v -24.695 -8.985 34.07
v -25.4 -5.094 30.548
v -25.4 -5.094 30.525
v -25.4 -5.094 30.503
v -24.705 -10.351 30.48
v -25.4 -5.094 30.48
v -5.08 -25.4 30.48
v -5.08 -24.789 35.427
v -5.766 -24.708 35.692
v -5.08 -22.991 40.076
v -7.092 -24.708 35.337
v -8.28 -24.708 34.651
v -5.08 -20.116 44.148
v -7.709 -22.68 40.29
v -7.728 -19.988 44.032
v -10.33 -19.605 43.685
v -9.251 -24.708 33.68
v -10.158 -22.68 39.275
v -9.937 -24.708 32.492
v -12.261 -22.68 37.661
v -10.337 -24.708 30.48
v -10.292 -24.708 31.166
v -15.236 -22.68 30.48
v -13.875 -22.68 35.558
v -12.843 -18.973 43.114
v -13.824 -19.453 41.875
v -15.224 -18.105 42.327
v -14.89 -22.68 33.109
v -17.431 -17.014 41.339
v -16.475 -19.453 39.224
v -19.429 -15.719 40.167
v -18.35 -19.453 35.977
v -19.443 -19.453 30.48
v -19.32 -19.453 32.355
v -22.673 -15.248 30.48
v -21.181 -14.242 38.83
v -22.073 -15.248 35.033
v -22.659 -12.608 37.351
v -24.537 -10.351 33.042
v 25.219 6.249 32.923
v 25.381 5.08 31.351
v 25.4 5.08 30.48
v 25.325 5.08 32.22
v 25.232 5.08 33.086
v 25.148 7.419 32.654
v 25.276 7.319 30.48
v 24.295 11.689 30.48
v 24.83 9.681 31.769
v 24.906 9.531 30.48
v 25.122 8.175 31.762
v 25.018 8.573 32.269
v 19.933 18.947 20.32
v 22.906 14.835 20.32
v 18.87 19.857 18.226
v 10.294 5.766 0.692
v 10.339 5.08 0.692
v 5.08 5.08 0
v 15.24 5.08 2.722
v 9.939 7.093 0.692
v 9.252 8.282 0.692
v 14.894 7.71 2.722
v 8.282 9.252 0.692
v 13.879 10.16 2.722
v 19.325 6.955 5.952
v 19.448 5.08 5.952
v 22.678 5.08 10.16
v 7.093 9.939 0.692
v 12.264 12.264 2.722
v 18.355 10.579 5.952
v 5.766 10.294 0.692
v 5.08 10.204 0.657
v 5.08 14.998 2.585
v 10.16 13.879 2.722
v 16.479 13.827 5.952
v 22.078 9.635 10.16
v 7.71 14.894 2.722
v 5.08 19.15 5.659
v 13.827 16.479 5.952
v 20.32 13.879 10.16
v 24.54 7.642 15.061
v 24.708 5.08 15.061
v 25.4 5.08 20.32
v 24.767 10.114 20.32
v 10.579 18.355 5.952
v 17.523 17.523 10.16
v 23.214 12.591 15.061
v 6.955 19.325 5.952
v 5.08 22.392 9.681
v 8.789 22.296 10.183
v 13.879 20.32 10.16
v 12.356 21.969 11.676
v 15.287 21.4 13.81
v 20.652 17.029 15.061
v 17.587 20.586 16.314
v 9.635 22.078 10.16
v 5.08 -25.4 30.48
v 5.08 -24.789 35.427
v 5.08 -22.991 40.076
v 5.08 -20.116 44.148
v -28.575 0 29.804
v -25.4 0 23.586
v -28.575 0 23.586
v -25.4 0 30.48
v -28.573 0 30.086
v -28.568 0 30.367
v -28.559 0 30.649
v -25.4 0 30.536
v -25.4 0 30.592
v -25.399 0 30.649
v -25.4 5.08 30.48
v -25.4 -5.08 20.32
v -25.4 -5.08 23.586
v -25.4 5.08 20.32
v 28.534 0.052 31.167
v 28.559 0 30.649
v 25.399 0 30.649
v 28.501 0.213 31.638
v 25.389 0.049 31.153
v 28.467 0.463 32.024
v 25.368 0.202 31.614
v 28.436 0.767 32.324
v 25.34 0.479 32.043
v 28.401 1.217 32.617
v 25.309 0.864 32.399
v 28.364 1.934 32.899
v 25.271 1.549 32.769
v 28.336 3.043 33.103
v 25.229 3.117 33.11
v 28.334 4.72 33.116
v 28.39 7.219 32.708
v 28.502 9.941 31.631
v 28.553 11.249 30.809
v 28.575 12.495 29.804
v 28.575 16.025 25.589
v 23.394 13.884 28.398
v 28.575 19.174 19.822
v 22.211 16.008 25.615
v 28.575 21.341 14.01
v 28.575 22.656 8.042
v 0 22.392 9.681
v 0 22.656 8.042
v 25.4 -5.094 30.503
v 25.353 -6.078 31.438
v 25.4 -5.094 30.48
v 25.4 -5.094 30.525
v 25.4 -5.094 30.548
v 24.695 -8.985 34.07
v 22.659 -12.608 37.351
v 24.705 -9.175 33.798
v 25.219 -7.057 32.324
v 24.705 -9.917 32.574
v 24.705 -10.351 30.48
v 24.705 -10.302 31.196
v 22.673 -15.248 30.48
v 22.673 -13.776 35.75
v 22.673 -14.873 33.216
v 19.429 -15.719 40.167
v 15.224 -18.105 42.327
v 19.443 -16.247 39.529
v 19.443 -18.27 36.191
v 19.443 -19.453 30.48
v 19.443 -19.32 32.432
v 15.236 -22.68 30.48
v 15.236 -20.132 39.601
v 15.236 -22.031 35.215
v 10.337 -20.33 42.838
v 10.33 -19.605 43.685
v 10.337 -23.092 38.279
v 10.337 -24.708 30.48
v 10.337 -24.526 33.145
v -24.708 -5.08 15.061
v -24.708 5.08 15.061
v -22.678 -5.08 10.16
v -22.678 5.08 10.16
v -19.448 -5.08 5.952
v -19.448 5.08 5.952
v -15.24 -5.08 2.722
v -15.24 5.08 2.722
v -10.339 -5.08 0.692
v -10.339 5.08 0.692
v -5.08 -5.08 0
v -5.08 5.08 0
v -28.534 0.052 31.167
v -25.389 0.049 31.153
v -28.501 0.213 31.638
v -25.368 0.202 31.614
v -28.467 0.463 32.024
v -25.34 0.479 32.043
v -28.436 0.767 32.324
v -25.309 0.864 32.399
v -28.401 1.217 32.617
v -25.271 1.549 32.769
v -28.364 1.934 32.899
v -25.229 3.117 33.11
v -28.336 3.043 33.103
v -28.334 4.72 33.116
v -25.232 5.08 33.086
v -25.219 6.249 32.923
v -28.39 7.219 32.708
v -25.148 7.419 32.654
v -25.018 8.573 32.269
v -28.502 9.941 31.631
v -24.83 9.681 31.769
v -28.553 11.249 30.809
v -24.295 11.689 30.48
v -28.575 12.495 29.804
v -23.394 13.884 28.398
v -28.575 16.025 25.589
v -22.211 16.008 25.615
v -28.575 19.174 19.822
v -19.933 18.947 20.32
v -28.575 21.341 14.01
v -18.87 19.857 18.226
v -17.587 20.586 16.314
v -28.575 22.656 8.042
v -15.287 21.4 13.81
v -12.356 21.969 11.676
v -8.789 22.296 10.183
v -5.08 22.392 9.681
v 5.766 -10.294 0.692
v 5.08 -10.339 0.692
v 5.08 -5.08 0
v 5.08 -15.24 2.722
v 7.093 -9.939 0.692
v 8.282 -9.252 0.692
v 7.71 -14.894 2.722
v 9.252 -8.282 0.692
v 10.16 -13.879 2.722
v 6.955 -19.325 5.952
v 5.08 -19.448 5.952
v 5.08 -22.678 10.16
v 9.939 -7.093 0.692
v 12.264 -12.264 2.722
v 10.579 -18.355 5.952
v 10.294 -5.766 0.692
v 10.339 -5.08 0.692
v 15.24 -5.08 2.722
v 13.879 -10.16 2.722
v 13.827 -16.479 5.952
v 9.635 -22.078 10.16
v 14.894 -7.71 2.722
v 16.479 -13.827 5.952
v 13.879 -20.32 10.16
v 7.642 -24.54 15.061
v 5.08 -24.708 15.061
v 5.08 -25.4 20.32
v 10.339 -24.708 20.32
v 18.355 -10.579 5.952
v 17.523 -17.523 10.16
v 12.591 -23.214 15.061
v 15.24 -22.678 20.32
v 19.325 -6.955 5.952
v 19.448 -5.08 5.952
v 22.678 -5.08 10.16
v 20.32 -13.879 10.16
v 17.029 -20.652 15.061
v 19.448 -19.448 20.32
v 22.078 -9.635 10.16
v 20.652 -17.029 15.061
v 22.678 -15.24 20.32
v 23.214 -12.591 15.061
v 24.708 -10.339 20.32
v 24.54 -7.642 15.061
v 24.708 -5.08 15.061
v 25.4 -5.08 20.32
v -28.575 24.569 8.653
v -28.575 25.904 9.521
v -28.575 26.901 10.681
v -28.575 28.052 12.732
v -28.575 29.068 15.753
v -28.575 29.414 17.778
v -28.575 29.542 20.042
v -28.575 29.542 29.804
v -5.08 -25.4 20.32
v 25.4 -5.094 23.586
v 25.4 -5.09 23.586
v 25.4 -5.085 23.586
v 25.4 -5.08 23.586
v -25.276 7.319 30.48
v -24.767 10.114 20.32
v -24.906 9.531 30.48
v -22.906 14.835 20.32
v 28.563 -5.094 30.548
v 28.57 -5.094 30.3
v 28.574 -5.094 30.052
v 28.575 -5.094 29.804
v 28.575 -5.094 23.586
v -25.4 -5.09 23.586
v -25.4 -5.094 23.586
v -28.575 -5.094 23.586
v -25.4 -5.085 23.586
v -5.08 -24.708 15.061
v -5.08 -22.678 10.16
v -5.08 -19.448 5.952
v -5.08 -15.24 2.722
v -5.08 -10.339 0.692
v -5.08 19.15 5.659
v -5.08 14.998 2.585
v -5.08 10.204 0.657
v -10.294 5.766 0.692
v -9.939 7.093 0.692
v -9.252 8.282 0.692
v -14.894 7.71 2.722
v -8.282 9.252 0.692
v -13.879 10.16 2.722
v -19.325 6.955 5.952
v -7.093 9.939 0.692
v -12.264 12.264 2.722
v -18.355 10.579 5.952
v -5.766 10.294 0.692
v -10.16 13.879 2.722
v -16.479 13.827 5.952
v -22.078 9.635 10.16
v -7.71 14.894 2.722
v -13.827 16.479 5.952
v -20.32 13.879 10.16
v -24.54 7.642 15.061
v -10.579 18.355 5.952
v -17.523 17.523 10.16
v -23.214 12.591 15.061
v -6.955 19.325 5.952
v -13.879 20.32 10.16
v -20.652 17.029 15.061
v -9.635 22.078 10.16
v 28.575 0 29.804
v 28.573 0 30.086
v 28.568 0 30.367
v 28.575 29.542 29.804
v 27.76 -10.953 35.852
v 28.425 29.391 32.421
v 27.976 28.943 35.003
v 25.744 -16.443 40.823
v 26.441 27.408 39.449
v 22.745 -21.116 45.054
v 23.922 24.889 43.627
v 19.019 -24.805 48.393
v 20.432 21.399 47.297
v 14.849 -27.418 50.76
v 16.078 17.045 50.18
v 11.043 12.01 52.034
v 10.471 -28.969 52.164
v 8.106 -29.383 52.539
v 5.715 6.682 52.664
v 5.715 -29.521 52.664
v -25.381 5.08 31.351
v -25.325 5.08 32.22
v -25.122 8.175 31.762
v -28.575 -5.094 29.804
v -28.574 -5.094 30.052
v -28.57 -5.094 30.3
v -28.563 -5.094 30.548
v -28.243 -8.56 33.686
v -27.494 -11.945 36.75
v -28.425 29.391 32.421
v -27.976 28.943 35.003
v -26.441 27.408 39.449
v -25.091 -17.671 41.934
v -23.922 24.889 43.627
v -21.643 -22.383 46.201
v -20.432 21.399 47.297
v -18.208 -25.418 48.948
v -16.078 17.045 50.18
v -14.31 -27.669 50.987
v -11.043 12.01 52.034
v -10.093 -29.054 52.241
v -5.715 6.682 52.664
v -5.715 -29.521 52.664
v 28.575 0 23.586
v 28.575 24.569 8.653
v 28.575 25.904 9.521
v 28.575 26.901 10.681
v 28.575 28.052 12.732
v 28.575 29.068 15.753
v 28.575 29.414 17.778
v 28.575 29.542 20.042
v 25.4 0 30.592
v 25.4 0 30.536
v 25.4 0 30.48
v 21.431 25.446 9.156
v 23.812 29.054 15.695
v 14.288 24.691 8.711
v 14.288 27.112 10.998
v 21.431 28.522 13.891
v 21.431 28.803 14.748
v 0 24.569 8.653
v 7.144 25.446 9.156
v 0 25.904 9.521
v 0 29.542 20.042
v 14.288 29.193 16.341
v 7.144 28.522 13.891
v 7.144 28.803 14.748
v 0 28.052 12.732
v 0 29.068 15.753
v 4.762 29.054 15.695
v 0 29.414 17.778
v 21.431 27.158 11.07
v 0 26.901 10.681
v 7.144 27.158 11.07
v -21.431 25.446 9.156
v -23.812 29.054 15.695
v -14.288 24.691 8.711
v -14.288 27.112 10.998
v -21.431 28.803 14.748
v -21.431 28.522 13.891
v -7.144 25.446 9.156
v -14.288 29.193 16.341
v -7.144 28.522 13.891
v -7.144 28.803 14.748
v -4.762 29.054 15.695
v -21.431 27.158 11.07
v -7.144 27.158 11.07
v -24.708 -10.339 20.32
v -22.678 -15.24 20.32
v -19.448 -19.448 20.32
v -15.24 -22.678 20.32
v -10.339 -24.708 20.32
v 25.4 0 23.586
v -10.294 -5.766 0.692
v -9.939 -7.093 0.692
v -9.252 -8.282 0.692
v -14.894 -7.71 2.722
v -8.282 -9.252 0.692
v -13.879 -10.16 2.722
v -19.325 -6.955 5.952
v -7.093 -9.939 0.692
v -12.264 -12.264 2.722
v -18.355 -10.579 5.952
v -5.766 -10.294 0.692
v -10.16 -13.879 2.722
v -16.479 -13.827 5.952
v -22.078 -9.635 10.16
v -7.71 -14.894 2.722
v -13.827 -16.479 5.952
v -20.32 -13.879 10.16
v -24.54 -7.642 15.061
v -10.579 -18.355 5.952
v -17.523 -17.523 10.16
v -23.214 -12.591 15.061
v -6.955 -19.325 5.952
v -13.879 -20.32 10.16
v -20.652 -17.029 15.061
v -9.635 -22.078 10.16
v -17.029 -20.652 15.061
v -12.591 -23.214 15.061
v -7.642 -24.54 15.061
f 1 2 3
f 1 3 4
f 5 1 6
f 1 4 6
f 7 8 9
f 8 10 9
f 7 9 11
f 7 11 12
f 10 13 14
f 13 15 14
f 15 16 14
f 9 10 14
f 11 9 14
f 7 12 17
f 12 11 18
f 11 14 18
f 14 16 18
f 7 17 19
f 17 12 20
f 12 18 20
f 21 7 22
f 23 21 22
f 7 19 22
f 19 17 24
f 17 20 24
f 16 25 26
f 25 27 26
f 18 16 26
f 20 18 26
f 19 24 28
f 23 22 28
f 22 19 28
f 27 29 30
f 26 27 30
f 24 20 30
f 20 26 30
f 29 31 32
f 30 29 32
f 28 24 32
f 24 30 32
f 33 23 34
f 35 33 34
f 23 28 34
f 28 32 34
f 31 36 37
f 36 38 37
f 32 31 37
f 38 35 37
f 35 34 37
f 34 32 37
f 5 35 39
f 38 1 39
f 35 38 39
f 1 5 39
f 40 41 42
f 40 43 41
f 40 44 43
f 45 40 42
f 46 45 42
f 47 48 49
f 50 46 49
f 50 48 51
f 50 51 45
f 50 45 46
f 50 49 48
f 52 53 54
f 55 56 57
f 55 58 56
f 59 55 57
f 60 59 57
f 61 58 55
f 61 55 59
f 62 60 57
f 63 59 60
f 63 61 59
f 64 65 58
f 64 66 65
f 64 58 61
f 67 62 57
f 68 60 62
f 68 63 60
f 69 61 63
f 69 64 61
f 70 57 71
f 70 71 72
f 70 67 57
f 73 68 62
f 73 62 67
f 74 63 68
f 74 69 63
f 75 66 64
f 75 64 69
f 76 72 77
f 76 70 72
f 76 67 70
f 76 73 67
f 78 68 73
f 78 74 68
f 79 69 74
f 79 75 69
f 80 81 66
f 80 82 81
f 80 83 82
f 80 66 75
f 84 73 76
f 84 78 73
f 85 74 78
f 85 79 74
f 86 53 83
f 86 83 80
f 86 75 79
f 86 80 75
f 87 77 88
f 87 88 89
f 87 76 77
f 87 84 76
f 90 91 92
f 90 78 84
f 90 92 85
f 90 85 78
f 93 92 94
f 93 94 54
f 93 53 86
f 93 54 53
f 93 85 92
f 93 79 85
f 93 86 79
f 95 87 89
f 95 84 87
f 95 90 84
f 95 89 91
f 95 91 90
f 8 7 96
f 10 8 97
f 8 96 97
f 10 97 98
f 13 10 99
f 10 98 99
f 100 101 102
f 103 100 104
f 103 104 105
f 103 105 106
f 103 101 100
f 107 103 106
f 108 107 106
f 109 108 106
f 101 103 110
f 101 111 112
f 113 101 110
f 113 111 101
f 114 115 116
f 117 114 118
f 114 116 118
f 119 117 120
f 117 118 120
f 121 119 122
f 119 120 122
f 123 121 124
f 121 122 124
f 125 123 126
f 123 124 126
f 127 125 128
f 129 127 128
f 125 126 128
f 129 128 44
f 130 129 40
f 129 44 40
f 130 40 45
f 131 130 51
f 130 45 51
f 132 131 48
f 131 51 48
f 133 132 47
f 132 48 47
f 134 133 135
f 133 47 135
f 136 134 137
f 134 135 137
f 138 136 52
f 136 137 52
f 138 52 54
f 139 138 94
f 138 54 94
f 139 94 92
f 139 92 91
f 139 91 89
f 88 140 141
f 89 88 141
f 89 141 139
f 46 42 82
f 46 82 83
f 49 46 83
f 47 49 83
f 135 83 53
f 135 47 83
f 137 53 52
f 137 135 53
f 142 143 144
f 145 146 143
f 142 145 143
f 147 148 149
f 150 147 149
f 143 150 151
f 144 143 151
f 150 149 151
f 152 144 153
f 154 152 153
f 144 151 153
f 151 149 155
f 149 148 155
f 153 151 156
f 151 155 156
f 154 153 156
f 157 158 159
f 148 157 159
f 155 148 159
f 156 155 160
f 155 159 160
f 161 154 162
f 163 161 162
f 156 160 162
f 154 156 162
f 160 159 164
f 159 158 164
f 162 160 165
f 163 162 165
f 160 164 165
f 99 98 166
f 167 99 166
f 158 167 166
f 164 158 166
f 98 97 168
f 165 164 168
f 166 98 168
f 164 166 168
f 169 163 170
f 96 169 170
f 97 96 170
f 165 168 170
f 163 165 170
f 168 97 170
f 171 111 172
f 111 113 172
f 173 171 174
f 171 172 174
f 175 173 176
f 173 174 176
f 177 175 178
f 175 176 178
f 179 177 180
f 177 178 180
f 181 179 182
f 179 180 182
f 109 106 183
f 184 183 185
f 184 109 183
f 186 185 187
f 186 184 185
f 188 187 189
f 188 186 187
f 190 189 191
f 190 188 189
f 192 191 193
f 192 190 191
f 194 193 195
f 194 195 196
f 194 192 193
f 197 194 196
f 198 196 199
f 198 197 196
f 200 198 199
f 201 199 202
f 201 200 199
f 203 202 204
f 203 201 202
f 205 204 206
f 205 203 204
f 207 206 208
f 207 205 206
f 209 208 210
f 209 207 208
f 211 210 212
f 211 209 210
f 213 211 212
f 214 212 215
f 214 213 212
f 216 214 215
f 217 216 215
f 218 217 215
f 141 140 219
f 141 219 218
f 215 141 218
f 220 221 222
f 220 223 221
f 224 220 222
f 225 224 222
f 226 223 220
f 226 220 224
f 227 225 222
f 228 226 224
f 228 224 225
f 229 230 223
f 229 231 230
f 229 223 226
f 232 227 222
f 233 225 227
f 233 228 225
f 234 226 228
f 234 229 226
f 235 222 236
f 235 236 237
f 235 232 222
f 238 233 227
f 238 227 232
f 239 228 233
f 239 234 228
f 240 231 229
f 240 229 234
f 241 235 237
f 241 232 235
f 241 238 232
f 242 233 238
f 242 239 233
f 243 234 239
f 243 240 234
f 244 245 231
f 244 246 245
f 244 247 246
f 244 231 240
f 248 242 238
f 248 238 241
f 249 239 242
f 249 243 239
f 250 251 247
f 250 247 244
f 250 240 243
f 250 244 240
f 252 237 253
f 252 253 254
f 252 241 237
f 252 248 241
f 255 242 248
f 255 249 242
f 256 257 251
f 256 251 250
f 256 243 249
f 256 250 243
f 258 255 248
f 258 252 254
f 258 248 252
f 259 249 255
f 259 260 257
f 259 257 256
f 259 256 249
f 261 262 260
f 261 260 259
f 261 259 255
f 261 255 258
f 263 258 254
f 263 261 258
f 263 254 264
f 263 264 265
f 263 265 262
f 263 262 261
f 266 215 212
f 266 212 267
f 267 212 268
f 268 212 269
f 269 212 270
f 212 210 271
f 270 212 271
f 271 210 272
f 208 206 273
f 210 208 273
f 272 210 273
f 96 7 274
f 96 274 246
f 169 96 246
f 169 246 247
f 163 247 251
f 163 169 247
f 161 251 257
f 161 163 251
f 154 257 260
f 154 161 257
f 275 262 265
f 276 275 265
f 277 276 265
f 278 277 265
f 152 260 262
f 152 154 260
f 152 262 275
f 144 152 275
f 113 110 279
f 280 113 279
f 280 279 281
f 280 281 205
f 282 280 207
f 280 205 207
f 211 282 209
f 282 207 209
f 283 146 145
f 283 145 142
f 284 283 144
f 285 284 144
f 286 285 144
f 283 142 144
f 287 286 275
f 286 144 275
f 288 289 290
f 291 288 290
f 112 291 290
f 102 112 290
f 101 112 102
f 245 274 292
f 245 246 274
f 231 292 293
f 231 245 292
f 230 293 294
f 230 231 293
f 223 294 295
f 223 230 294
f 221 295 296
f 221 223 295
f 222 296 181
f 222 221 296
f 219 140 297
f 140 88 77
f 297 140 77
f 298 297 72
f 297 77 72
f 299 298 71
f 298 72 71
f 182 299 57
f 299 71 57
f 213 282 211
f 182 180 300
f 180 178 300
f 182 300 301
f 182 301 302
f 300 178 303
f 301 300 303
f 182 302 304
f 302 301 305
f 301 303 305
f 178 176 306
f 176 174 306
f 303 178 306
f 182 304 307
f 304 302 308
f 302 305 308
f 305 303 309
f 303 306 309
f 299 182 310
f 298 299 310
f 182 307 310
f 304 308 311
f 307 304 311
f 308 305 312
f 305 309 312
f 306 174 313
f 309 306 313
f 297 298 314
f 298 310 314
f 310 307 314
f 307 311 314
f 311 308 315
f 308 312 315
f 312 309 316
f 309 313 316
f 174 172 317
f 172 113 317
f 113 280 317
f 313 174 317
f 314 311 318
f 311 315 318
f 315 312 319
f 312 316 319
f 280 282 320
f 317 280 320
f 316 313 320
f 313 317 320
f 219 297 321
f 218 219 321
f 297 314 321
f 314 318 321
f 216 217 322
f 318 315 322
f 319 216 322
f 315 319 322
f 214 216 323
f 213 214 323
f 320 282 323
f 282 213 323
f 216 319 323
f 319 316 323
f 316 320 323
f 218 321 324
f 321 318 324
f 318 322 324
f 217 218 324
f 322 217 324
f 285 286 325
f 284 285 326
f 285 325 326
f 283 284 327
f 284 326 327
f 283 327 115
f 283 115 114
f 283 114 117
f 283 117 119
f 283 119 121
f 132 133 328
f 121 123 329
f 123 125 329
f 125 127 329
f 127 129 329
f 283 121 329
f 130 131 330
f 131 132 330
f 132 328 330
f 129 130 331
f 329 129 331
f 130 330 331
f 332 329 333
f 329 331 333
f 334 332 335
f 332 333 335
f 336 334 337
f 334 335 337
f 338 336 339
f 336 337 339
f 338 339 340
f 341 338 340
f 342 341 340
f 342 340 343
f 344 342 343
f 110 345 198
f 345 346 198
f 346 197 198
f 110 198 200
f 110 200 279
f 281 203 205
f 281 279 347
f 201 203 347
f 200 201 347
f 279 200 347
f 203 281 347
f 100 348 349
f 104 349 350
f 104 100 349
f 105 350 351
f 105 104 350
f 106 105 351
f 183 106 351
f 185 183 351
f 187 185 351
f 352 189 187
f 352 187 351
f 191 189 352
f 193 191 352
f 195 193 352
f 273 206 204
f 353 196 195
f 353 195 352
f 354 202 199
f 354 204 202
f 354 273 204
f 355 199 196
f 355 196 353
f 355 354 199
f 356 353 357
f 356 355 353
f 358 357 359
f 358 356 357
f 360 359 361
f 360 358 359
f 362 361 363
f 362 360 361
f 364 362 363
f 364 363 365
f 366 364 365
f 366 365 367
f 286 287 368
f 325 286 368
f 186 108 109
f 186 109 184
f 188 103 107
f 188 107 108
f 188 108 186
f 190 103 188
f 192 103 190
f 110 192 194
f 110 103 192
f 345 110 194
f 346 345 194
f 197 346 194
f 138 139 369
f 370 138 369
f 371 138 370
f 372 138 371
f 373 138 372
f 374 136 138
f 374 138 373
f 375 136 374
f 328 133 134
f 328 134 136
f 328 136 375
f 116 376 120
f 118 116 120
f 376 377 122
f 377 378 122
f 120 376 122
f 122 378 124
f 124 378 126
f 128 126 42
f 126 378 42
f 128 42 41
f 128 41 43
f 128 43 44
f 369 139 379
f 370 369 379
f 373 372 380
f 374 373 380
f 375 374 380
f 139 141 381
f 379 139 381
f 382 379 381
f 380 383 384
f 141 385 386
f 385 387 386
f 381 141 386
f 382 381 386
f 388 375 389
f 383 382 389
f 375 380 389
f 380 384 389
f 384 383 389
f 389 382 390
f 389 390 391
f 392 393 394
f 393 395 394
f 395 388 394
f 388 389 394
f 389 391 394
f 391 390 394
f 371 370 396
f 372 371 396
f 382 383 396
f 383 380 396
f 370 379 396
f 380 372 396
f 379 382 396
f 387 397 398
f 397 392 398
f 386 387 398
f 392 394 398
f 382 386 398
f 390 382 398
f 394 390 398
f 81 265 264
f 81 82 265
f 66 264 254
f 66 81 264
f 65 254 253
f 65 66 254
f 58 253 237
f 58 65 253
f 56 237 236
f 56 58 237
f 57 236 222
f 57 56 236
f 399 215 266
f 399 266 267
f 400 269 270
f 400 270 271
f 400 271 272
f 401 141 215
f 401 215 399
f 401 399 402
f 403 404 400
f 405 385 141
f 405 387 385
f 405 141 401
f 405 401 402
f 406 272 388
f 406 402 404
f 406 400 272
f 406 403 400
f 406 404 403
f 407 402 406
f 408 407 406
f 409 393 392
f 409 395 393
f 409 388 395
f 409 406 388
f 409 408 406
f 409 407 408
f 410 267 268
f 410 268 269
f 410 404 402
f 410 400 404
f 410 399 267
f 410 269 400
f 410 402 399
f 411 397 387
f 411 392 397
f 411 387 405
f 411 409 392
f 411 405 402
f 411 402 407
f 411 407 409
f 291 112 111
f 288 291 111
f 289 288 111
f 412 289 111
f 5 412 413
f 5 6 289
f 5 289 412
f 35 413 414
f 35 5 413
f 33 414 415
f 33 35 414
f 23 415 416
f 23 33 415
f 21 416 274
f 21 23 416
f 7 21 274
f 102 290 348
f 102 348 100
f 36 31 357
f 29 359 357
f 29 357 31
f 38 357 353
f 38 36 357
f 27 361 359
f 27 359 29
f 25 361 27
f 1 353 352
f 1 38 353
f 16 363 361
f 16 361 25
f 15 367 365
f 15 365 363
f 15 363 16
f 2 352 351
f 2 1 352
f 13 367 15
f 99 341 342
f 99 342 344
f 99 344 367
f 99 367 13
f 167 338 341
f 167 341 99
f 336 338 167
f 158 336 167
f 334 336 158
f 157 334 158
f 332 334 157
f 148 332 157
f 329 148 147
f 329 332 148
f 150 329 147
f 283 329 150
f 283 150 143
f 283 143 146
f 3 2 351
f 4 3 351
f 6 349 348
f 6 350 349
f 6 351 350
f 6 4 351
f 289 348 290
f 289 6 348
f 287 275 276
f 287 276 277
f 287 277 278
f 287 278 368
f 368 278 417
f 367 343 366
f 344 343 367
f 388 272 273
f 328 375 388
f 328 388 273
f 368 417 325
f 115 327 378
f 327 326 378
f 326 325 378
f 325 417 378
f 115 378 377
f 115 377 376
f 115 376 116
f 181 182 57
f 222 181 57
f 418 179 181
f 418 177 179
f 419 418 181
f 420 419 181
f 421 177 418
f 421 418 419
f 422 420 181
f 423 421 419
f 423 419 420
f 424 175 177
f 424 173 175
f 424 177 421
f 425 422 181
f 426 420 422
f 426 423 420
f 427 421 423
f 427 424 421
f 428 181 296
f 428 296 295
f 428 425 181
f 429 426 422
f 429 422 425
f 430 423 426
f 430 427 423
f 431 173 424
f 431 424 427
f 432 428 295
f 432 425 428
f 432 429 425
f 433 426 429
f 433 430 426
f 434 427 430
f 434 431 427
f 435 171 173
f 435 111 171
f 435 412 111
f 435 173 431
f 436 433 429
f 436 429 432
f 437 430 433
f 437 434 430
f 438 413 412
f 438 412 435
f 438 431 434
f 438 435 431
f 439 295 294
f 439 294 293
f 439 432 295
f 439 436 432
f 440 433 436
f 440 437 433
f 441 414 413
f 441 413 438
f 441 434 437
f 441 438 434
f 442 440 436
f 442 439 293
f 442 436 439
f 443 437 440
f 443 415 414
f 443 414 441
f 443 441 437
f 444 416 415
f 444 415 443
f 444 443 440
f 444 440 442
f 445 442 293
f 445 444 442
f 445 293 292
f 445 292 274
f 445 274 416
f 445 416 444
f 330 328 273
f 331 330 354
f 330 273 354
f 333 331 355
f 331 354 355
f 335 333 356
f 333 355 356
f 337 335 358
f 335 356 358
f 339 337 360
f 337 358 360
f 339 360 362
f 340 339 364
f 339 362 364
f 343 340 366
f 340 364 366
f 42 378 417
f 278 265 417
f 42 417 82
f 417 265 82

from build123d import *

# Parameters (mm, degrees)
F0_W          = 50.8
F0_H          = 50.8
F1_DEPTH      = 50.8
F2_R          = 20.32
F4_DEPTH      = 28.575
F4_DEPTH_BACK = 28.575
F5_T1_DEPTH   = 171.45
F5_T3_DEPTH   = 173.3631305569


# Not quite as in the source:
# - a fillet or chamfer that OpenCascade refuses, or shapes differently, is made with other operations: its cross-section is extruded or revolved along the edge and cut away or added


with BuildPart() as f1:
    # F0 (on Top) → F1 (new body)
    with BuildSketch(Plane.XY):
        Rectangle(F0_W, F0_H)
    extrude(amount=F1_DEPTH)

    # F2
    f2_edges = [f1.edges().sort_by_distance(p)[0] for p in [
        (0, 25.4, 50.8),
        (-25.4, 0, 50.8),
        (0, -25.4, 50.8),
        (25.4, 0, 50.8),
        (-25.4, 25.4, 25.4),
        (-25.4, -25.4, 25.4),
        (-25.4, 0, 0),
        (25.4, -25.4, 25.4),
        (0, -25.4, 0),
        (25.4, 25.4, 25.4),
        (25.4, 0, 0),
        (0, 25.4, 0),
    ]]
    fillet(f2_edges, radius=F2_R)

    # F3 (on Right) → F4 (join, two sides)
    with BuildSketch(Plane.YZ) as f4_sk:
        with BuildLine():
            Line((0, 23.585671559), (0, 30.6485332549))
            add(Edge.make_bspline(
                [(0, 30.6485332549), (0, 33.0861583352), (7.1330016043, 33.8045146668), (15.9690734978, 28.3277997784), (21.6986452978, 15.0790064451), (22.6556025445, 8.0415420234)],
                knots=[0, 0, 0, 0, 0.2426532196, 0.5552693869, 1, 1, 1, 1], degree=3))
            add(Edge.make_bspline(
                [(22.6556025445, 8.0415420234), (25.1164599813, 8.5749836186), (27.5161694097, 10.7134623968), (29.5368228108, 15.9953534603), (29.541708529, 20.0420022011)],
                knots=[0, 0, 0, 0, 0.4304337748, 1, 1, 1, 1], degree=3))
            Line((29.541708529, 20.0420022011), (29.541708529, 52.6639260352))
            Line((29.541708529, 52.6639260352), (-29.5214220279, 52.6639260352))
            Line((-29.5214220279, 52.6639260352), (-5.094319582, 30.5475965142))
            Line((-5.094319582, 30.5475965142), (-5.094319582, 23.585671559))
            Line((-5.094319582, 23.585671559), (0, 23.585671559))
        make_face()
    extrude(amount=F4_DEPTH)
    extrude(f4_sk.sketch, amount=-F4_DEPTH_BACK)

    # F5: fillet of radius 22.86 on 3 edges, made by hand

    # F5_s2 → F5_t1 (cut)
    with BuildSketch(Plane.YZ.offset(-85.725)):
        with BuildLine():
            ThreePointArc((29.541708529, 29.8039260352), (22.8461695469, 45.9683870531), (6.681708529, 52.6639260352))
            Line((6.681708529, 52.6639260352), (29.541708529, 52.6639260352))
            Line((29.541708529, 52.6639260352), (29.541708529, 29.8039260352))
        make_face()
    extrude(amount=F5_T1_DEPTH, mode=Mode.SUBTRACT)

    # F5_s4 → F5_t3 (cut)
    with BuildSketch(Plane.XZ.offset(-86.691708529)):
        with BuildLine():
            ThreePointArc((-28.575, 29.8039260352), (-21.8794610179, 45.9683870531), (-5.715, 52.6639260352))
            Line((-5.715, 52.6639260352), (-28.575, 52.6639260352))
            Line((-28.575, 52.6639260352), (-28.575, 29.8039260352))
        make_face()
        with BuildLine():
            ThreePointArc((28.575, 29.8039260352), (21.8794610179, 45.9683870531), (5.715, 52.6639260352))
            Line((5.715, 52.6639260352), (28.575, 52.6639260352))
            Line((28.575, 52.6639260352), (28.575, 29.8039260352))
        make_face()
    extrude(amount=F5_T3_DEPTH, mode=Mode.SUBTRACT)


solid = f1.part
